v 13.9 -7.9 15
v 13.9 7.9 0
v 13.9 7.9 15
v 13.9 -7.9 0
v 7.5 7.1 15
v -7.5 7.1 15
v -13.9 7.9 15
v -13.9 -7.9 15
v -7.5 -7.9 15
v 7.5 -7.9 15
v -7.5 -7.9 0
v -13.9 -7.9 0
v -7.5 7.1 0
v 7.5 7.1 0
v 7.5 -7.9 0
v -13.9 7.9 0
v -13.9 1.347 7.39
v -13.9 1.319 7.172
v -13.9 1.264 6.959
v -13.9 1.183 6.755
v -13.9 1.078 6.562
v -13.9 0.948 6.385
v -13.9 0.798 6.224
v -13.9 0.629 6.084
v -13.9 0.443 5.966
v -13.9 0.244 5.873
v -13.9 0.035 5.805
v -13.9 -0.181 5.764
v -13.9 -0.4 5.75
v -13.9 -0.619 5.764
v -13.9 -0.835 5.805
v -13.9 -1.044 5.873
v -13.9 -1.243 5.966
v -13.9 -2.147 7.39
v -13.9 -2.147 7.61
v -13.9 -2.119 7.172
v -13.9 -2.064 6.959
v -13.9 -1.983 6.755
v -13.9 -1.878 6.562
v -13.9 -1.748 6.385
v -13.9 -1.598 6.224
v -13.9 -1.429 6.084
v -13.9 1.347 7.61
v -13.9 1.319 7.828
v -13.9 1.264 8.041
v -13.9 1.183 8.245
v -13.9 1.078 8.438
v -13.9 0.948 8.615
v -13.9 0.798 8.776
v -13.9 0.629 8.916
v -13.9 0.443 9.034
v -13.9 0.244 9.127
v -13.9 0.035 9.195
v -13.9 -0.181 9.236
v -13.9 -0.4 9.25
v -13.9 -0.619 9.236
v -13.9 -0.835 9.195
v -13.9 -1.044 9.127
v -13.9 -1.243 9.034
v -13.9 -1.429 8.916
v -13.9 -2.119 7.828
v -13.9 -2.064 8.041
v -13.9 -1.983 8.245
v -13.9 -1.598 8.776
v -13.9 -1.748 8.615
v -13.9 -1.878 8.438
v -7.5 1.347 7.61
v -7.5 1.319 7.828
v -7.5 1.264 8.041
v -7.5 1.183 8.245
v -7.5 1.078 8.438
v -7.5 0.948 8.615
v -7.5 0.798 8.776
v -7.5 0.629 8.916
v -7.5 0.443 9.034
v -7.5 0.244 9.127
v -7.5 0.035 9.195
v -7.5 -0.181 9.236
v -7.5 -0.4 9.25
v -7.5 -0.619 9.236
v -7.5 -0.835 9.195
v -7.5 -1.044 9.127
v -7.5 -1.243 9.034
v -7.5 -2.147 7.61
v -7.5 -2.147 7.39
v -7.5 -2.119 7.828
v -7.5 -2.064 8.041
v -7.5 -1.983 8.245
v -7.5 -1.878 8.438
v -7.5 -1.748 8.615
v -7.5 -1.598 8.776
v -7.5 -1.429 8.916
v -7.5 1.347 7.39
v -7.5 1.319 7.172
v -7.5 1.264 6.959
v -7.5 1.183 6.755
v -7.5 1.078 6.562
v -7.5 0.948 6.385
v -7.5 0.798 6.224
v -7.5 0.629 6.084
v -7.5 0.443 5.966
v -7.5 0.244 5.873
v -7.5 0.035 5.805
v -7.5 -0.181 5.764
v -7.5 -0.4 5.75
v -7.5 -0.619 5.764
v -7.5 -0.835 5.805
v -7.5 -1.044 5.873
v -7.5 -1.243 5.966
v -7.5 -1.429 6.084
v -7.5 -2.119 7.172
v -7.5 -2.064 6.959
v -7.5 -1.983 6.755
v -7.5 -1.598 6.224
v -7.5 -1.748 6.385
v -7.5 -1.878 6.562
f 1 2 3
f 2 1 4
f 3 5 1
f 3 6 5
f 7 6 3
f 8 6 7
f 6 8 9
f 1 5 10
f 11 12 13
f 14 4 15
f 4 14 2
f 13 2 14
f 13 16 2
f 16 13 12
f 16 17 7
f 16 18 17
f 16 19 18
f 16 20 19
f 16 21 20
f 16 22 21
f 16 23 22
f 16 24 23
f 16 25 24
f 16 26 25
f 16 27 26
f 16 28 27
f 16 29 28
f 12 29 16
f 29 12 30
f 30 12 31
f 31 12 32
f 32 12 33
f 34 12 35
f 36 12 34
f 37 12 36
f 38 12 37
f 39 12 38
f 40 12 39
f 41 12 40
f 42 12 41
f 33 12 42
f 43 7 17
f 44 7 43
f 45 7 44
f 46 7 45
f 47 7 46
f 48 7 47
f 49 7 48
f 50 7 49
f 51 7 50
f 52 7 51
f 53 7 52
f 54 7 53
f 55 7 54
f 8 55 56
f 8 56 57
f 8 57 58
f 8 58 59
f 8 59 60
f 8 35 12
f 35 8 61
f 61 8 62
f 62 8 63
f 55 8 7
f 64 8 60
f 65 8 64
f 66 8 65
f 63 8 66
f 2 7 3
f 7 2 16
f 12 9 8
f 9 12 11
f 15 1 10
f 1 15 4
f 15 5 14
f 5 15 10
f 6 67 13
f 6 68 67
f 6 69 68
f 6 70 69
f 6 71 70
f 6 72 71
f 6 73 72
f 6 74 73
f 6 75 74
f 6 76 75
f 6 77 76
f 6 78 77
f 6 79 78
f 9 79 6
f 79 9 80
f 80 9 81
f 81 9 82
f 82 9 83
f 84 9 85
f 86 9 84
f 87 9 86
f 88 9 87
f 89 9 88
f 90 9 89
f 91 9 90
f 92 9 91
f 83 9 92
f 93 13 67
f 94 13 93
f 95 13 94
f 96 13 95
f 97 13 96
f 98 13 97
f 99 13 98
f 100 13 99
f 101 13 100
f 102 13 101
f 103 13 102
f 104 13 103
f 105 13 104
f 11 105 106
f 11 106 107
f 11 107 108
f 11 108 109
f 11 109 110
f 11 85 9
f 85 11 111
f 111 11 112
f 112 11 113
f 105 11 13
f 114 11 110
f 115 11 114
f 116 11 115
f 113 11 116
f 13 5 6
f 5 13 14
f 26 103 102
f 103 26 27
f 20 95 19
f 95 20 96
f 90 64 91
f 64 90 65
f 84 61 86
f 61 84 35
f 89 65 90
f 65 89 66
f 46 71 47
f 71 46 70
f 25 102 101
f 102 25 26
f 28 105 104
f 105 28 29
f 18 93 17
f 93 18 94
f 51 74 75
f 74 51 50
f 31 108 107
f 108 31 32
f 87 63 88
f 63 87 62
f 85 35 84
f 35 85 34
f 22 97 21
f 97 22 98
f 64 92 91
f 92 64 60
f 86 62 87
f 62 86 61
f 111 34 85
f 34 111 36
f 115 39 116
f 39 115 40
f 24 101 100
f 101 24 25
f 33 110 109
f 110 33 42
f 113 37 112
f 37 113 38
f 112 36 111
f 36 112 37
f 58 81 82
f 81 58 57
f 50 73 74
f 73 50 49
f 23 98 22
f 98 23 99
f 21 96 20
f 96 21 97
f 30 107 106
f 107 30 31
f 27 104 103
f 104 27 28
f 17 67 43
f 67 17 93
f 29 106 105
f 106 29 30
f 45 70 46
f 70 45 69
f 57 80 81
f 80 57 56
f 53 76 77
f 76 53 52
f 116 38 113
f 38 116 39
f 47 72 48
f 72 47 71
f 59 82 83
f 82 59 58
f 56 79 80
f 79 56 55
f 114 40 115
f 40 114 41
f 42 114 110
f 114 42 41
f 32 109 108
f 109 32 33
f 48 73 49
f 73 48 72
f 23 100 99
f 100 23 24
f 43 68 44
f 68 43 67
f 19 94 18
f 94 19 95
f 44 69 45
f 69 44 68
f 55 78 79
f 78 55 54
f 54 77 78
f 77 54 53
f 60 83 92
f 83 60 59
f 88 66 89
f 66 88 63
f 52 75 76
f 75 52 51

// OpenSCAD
use <MCAD/regular_shapes.scad>

diag_bar_w = 8;
horiz_bar_w = 15;



module keypad_bracket(bar_w) {
    $fn=50;
    bar_d = 15;
    filament_w = 0.4;
    bracket_w = 15;
    nut_t = 3.2;
    nut_s = 7;
    nut_r = nut_s / 2 / cos(30);
    nut_d = nut_r * 2;
    wall_t = nut_t * 2;
    outer_w = bar_d + filament_w * 2;
    outer_l = bar_w + wall_t * 2;
    screw_d = 3.5;
    screw_r = screw_d / 2;
    
    translate([-outer_l/2, -outer_w/2, 0])
    difference() {
        cube([outer_l, outer_w, bracket_w]);
        translate([wall_t, -1, -1])
        cube([bar_w, bar_d + 1, bracket_w + 2]);
        
        translate([wall_t - nut_t, nut_s / 2 + (bar_d - nut_s)/2 , nut_r + (bracket_w - nut_d)/2])
        rotate([90, 90, 90])
        linear_extrude(height=nut_t + 1)
        hexagon(across_flats=nut_s);
        
        translate([-1, screw_r + (bar_d - screw_d)/2, screw_r + (bracket_w - screw_d)/2])
        rotate([0, 90, 0])
        cylinder(h=wall_t + 1, r=screw_r);
    }
}


keypad_bracket(horiz_bar_w);

//
